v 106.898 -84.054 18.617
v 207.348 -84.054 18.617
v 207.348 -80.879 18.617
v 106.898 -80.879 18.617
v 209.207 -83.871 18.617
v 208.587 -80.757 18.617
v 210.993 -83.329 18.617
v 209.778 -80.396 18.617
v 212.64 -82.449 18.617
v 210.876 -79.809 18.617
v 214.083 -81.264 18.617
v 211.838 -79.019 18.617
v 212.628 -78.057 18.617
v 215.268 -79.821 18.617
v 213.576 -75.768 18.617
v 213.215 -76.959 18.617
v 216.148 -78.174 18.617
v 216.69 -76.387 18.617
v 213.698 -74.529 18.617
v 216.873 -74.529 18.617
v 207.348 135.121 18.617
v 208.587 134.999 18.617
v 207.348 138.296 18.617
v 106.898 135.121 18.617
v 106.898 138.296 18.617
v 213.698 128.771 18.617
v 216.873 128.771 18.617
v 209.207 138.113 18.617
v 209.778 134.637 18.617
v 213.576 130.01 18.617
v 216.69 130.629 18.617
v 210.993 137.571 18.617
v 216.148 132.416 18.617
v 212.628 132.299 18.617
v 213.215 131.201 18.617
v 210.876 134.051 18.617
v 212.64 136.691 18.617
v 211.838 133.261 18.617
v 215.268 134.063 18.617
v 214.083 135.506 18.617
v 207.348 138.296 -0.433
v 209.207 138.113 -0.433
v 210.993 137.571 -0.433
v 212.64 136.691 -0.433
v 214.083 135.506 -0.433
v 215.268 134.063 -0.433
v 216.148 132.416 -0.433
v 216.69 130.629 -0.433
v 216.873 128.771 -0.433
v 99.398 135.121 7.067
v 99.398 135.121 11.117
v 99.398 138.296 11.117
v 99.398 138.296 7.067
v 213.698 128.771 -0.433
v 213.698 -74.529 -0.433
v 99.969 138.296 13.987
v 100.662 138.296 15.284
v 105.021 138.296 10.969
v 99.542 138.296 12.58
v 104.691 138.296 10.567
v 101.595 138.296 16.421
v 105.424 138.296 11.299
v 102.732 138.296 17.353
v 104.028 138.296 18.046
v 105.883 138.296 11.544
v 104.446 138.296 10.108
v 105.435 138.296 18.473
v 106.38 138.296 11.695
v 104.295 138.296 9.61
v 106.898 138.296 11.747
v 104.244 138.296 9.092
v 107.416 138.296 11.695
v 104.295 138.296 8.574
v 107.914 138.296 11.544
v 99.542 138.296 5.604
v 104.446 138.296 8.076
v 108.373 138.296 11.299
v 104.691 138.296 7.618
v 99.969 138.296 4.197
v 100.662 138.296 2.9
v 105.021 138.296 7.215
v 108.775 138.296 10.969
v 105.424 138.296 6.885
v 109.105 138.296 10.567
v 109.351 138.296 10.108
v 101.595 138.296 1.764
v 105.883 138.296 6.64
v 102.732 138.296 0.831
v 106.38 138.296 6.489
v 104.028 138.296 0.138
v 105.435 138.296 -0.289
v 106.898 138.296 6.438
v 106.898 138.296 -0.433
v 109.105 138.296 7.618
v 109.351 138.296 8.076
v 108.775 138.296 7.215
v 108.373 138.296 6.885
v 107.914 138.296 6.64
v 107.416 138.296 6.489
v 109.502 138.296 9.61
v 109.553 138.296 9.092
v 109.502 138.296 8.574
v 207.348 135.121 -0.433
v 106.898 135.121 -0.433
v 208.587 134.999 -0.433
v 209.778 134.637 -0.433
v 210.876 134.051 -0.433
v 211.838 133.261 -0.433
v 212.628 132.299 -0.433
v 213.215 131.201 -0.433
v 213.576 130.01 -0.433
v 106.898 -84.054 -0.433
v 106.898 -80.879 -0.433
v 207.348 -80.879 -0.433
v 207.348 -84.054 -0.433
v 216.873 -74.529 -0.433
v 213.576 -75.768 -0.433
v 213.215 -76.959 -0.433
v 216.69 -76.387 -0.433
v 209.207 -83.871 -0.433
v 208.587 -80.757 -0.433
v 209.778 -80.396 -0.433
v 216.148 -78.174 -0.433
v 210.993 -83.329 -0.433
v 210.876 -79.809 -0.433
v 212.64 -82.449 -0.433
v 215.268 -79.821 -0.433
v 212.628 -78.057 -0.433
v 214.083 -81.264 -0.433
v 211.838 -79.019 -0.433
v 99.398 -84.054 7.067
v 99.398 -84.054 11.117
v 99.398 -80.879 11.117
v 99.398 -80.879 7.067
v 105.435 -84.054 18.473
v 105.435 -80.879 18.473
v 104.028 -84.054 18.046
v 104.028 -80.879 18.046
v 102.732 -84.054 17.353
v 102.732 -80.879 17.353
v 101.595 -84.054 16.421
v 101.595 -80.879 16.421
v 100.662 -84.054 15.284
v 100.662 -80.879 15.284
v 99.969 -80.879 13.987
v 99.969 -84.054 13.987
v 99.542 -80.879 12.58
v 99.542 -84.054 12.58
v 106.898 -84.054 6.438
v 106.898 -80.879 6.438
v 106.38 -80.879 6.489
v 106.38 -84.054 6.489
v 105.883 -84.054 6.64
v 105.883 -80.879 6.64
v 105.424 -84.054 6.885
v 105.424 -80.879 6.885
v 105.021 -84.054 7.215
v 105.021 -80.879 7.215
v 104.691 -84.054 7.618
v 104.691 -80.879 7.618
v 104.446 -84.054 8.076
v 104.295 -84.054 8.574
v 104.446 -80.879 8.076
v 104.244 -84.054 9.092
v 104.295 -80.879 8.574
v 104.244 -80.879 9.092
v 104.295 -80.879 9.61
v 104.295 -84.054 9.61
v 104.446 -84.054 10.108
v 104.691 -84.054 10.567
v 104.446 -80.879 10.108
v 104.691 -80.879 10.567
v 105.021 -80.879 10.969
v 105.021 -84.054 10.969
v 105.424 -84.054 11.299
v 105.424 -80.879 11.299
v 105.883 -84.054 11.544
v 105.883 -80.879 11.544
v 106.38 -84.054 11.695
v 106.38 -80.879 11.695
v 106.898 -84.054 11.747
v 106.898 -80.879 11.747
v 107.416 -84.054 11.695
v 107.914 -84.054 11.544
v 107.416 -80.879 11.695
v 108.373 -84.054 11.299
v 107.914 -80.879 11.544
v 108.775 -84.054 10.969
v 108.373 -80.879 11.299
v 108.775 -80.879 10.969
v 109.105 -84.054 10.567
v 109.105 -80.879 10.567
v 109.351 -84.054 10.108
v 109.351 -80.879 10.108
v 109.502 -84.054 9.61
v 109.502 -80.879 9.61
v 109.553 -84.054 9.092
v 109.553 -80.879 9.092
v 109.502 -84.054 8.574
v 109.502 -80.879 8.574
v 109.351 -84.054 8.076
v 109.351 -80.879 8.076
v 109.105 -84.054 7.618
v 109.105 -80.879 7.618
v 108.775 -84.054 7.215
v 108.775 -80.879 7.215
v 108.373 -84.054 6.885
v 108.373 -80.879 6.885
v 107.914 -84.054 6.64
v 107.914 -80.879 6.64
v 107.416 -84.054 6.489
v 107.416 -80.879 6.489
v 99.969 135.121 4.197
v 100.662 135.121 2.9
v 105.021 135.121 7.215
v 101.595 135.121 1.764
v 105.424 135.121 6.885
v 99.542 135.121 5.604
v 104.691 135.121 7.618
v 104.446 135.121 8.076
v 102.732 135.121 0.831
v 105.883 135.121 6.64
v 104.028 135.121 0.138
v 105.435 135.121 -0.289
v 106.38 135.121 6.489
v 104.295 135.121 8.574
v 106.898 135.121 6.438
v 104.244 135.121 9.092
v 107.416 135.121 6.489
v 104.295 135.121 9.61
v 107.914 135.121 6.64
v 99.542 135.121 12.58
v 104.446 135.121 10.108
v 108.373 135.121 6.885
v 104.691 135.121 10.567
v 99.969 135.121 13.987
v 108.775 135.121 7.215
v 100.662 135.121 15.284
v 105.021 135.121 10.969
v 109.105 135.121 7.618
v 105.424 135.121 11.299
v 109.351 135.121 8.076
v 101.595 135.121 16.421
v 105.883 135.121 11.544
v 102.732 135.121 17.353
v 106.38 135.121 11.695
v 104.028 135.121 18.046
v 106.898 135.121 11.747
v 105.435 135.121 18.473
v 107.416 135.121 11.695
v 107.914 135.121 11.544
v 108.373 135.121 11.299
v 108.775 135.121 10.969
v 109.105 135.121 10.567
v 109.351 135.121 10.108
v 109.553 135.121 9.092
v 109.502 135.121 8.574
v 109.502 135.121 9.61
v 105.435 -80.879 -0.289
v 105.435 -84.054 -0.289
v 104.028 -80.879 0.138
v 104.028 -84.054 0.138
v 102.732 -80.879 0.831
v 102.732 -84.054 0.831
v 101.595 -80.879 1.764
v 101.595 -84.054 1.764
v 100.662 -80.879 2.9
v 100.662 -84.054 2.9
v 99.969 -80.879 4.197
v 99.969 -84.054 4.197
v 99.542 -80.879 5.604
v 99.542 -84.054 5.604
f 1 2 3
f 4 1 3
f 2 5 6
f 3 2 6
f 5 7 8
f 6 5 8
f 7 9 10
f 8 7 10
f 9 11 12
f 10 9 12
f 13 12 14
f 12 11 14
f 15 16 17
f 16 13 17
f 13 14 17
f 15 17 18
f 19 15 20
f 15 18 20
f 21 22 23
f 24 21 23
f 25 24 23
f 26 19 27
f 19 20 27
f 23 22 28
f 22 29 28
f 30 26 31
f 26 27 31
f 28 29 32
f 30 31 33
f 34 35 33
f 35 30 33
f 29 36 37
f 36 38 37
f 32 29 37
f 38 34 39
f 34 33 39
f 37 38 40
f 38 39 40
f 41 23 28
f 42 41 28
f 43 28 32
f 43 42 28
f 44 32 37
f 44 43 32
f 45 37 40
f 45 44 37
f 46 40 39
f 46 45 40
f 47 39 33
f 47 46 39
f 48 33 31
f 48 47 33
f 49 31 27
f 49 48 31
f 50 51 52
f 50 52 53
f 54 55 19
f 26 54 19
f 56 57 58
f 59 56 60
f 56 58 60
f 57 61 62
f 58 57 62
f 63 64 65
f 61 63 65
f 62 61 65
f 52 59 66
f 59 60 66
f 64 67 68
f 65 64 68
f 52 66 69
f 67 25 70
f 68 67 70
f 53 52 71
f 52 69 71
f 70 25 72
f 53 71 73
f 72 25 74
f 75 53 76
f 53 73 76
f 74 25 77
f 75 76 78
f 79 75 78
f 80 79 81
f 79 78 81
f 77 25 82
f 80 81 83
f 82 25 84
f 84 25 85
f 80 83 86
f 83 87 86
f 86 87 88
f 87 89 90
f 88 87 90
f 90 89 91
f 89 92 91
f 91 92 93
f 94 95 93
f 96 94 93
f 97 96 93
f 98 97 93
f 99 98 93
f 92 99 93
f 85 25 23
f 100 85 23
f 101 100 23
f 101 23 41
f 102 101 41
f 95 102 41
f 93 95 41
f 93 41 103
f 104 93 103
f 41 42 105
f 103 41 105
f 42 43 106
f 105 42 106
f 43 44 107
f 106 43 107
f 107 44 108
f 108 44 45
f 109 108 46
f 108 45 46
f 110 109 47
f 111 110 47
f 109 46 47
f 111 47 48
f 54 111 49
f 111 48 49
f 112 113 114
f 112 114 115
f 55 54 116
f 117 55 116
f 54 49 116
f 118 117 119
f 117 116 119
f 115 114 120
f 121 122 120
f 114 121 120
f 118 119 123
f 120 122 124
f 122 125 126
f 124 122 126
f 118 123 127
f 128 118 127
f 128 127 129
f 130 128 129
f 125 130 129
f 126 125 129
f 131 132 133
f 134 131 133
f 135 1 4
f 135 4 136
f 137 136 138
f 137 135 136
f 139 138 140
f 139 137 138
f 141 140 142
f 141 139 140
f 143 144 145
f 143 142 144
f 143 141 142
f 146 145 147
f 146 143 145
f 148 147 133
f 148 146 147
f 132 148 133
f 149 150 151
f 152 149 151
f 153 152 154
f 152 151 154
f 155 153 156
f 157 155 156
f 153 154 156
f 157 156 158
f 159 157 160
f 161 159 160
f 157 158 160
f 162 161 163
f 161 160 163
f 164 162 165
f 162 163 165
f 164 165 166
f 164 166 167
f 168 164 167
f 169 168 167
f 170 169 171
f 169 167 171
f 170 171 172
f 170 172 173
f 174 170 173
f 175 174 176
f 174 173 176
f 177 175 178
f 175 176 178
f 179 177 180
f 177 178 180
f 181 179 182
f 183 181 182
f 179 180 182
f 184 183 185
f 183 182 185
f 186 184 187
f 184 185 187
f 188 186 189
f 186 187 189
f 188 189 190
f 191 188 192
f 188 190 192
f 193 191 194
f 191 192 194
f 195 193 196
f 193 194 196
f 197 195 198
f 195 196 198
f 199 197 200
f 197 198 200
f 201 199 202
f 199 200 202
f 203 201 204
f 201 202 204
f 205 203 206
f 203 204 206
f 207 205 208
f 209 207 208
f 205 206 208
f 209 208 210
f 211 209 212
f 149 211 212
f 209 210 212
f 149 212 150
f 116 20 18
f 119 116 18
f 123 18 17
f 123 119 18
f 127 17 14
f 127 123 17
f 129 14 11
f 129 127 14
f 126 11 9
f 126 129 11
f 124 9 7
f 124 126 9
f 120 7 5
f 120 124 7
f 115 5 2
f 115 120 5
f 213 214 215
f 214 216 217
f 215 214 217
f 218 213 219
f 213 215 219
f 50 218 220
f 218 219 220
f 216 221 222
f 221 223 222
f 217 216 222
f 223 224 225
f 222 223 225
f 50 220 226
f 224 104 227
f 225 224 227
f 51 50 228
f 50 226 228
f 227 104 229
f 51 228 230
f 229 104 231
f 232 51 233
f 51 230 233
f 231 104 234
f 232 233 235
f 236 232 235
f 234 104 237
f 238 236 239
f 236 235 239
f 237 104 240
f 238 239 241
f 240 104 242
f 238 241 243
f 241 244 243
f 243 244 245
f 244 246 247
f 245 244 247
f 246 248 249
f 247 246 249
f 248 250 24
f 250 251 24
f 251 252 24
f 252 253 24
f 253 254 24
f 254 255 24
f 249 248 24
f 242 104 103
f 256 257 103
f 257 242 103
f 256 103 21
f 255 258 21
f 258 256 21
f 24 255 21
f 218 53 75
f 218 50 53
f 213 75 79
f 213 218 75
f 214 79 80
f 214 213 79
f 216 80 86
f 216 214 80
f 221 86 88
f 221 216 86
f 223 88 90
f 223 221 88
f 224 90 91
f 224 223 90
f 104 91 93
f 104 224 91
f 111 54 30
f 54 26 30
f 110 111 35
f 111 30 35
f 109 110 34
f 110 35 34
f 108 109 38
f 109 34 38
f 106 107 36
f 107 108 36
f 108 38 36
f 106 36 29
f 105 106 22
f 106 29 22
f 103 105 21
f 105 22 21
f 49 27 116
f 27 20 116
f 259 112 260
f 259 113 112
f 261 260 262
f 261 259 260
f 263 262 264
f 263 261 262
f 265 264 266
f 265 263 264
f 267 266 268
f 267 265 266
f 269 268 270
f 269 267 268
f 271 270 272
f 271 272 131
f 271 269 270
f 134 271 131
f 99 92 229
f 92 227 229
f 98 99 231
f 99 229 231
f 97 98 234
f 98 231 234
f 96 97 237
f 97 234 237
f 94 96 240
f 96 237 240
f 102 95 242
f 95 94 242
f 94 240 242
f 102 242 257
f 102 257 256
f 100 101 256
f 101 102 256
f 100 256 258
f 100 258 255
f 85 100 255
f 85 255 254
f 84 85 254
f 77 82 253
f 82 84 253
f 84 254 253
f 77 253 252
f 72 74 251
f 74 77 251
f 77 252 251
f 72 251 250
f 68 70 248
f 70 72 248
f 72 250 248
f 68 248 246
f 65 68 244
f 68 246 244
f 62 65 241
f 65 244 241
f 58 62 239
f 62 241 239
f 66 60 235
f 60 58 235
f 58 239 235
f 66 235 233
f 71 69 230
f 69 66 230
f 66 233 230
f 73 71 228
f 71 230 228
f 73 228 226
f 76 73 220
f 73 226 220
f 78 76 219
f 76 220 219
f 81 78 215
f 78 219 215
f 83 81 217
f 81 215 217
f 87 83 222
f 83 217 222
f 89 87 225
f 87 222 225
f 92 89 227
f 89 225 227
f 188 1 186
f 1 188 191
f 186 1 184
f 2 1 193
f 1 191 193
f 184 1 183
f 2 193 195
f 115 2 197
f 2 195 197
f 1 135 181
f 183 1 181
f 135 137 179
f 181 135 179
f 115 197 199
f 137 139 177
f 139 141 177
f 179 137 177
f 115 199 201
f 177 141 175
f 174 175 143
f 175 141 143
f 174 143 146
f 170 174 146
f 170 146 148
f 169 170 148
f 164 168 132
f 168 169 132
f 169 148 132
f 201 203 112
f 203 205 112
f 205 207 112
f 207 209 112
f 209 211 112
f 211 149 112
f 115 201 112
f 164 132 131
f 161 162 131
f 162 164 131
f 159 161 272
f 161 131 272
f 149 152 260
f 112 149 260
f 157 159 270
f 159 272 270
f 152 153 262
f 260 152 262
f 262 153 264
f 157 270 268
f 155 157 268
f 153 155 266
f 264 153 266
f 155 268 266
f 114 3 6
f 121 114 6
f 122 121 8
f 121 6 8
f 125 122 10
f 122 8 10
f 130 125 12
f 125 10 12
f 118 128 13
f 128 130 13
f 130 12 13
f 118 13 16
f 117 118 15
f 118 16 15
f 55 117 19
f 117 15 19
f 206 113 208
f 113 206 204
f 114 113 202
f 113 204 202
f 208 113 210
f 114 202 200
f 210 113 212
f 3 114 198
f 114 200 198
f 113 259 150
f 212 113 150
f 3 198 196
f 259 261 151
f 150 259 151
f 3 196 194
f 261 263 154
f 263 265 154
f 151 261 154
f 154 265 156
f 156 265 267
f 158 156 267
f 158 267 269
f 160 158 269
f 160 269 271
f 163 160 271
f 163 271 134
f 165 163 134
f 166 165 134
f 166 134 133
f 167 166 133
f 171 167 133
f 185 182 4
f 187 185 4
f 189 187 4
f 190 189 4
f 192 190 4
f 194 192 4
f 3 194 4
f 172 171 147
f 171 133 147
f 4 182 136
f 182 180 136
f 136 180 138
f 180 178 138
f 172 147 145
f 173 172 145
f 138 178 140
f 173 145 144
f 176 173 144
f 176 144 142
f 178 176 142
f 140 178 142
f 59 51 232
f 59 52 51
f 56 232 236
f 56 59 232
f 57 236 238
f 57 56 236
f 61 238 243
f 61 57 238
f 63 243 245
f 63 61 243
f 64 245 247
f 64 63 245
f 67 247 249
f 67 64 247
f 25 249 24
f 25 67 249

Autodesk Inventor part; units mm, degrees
ref_plane "YZ Plane" through (0, 0, 0) normal (1, 0, 0) x (0, 1, 0)
ref_plane "XZ Plane" through (0, 0, 0) normal (0, 1, 0) x (-1, 0, 0)
ref_plane "XY Plane" through (0, 0, 0) normal (0, 0, 1) x (1, 0, 0)
ref_plane "Work Plane1" through (122.7733, 133.3708, 9.0922) normal (0, 0, 1) x (1, 0, 0)
sketch "Sketch1" plane through (122.7733, 133.3708, 9.0922) normal (0, 0, 1) x (1, 0, 0)
  line L0 (-23.375, 1.75) -> (-8.375, 1.75) construction
  line L1 (-8.375, -214.25) -> (-23.375, -214.25) construction
  line L2 (-23.375, 1.75) -> (84.575, 1.75)
  line L3 (90.925, -4.6) -> (90.925, -207.9)
  line L4 (84.575, -214.25) -> (-23.375, -214.25)
  arc A0 (90.925, -4.6) -> (84.575, 1.75) centre (84.575, -4.6) ccw
  arc A1 (84.575, -214.25) -> (90.925, -207.9) centre (84.575, -207.9) ccw
  point P0 (-122.7733, -133.3708)
  point P1 (90.925, 1.75)
  point P2 (90.925, -214.25)
  dimension "d0" = 114.3
  dimension "d3" = 6.35
ref_plane "Work Plane3" through (99.3983, 135.1208, 9.0922) normal (-1, 0, 0) x (0, 1, 0)
ref_plane "Work Plane2" through (44.8233, 115.6208, -3.6078) normal (-1, 0, 0) x (0, 1, 0)
sketch "Sketch3" plane through (99.3983, 135.1208, 9.0922) normal (-1, 0, 0) x (0, 1, 0)
  line L0 (3.175, -9.525) -> (0, -9.525)
  line L1 (0, -9.525) -> (0, 9.525)
  line L2 (0, 9.525) -> (3.175, 9.525)
  line L3 (3.175, 9.525) -> (3.175, -9.525)
  line L4 (0, 7.5) -> (0, -7.5) projected
  line L5 (-1.2141, 0) -> (3.175, 0) construction
  point P0 (-135.1208, 9.0922)
  point P1 (0, 0)
  dimension "d4" = 3.175
  dimension "d15" = 19.05
sweep "Sweep1" add profiles "Sketch3" path "Sketch1"
fillet "Fillet1" radius 7.5 4 edges at (99.3983, 136.7083, -0.4328) (99.3983, -82.4667, -0.4328) (99.3983, 136.7083, 18.6172) (99.3983, -82.4667, 18.6172)
sketch "Sketch4" plane through (207.3483, -84.0542, -0.4328) normal (0, -1, 0) x (1, 0, 0)
  circle A0 centre (-100.45, 9.525) radius 2.7559 projected
  point P0 (-207.3483, 0.4328)
hole "Hole1" at (106.8983, -84.0542, 9.0922) direction (0, 1, 0) diameter 5.3086 depth 3.175
ref_plane "Work Plane4" through (207.3483, 27.1208, 18.6172) normal (0, 1, 0) x (1, 0, 0)
mirror "Mirror1" about plane through (207.3483, 27.1208, 18.6172) normal (0, 1, 0) of "Hole1"
properties part number "Pivoting Bracket"
